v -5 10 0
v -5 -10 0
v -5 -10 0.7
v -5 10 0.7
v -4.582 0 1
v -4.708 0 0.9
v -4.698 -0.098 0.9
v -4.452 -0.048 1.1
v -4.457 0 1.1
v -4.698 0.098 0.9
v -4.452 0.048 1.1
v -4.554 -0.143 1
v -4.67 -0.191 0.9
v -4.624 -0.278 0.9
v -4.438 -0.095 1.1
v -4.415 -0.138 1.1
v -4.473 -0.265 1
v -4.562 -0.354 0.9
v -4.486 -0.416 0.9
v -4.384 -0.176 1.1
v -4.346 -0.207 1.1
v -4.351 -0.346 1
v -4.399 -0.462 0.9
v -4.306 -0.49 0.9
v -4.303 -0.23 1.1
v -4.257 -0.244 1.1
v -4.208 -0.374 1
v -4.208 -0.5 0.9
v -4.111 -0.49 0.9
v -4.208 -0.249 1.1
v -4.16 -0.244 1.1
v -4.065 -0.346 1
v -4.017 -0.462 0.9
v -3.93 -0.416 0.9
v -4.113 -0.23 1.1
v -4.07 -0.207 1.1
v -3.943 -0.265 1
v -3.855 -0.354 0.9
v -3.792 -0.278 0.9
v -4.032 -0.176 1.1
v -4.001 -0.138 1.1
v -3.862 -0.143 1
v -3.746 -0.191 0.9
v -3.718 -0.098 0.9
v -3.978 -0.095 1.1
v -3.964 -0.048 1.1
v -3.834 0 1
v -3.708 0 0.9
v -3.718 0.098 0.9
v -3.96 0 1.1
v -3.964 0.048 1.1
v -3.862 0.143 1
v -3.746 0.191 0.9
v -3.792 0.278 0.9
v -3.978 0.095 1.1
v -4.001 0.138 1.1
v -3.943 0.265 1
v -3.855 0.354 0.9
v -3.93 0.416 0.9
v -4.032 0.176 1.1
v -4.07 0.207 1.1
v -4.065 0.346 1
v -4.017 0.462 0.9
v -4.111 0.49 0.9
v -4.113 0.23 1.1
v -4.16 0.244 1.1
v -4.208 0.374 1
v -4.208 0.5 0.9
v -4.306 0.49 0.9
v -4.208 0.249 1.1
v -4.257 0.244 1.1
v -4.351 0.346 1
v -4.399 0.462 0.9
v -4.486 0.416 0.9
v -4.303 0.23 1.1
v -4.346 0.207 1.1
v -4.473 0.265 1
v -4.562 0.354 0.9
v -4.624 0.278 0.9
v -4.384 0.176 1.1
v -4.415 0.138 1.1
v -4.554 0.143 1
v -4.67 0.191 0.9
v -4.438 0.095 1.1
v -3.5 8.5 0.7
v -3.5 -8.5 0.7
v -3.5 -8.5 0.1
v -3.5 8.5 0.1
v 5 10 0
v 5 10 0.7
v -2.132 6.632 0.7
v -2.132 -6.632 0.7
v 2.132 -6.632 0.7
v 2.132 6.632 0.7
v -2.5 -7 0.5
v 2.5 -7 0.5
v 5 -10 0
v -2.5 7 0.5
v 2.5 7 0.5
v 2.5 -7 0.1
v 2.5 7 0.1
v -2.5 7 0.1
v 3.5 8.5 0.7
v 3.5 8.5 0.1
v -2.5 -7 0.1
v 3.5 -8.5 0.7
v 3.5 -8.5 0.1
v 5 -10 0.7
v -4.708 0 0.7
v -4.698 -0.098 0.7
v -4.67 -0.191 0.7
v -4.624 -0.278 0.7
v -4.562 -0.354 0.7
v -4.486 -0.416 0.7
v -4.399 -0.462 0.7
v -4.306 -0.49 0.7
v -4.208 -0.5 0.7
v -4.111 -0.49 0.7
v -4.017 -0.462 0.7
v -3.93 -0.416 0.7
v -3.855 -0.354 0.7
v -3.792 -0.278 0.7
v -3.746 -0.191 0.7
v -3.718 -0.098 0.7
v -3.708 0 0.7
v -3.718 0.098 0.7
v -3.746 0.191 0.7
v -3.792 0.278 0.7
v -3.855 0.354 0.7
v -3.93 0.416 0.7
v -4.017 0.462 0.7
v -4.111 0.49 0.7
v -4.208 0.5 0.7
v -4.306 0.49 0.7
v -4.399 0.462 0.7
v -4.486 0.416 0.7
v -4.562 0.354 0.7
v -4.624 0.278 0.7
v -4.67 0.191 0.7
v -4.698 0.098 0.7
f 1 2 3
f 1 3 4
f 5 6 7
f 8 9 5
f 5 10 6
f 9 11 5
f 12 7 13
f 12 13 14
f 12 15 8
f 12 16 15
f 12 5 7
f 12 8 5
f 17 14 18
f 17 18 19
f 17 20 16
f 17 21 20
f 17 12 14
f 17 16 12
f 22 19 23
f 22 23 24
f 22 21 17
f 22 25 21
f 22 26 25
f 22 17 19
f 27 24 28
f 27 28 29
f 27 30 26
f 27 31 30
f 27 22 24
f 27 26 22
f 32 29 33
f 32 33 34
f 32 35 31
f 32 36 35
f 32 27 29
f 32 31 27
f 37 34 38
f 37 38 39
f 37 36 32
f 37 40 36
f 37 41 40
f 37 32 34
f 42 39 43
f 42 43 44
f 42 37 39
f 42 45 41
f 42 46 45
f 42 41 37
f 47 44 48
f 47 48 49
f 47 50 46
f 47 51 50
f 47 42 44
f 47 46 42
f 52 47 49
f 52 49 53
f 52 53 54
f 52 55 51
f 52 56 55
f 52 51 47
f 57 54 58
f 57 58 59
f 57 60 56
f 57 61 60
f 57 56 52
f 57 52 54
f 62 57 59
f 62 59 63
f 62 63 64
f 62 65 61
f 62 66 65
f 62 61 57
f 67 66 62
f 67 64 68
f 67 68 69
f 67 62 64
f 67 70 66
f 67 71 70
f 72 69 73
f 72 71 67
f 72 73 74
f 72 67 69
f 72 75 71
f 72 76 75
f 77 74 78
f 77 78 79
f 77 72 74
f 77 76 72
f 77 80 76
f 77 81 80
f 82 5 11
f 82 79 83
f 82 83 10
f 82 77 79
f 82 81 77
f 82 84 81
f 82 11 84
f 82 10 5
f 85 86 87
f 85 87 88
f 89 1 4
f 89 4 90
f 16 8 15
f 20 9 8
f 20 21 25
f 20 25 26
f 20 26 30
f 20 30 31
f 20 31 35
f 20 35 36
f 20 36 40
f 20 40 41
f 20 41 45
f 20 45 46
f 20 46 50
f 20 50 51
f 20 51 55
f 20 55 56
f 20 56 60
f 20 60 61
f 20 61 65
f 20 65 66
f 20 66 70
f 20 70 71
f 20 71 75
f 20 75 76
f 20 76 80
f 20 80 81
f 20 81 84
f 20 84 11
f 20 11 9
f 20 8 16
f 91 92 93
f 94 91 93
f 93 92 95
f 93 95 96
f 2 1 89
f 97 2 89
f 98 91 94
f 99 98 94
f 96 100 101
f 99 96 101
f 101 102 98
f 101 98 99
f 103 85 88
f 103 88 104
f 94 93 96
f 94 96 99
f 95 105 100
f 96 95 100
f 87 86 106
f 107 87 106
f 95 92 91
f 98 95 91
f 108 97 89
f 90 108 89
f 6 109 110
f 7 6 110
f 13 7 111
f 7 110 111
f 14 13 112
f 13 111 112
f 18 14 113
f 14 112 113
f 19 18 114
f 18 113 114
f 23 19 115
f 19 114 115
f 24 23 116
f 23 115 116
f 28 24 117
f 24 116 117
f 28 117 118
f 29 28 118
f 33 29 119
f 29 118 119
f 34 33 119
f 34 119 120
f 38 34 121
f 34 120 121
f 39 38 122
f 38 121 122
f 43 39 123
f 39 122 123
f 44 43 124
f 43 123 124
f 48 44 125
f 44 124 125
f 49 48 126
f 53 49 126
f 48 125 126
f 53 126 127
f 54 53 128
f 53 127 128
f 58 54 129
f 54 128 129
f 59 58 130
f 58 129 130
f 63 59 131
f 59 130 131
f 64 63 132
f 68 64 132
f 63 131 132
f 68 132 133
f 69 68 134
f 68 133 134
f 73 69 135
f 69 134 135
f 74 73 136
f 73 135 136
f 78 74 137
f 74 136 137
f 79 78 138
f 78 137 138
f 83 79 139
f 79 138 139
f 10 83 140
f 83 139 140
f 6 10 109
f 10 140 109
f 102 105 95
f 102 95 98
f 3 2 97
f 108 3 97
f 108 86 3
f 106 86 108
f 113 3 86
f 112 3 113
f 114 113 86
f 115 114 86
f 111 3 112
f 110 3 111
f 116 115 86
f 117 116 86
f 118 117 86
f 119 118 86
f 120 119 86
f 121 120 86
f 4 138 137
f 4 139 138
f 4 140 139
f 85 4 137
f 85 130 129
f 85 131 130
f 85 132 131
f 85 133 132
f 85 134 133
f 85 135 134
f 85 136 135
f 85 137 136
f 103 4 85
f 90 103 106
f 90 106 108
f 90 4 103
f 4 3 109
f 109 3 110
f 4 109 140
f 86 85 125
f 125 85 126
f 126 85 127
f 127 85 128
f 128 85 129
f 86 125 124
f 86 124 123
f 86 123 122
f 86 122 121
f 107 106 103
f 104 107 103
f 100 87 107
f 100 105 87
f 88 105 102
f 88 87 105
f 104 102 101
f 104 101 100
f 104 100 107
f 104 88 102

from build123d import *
from OCP.BRepFilletAPI import BRepFilletAPI_MakeChamfer

# Parameters (mm, degrees)
CROQUIS2_W              = 10
CROQUIS2_H              = 20
SALIENTE_EXTRUIR1_DEPTH = 0.7
CROQUIS3_W              = 7
CROQUIS3_H              = 17
CORTAR_EXTRUIR1_DEPTH   = 0.6
CROQUIS4_W              = 5
CROQUIS4_H              = 14
SALIENTE_EXTRUIR2_DEPTH = 0.6
CHAFL_N1_SIZE           = 0.2
CHAFL_N1_SIZE2          = 0.368354177
CROQUIS5_R              = 0.5
SALIENTE_EXTRUIR3_DEPTH = 0.4
CHAFL_N2_SIZE           = 0.2
CHAFL_N2_SIZE2          = 0.25143446


with BuildPart() as part:
    # Croquis2 → Saliente-Extruir1 (new body)
    with BuildSketch(Plane.XY):
        Rectangle(CROQUIS2_W, CROQUIS2_H)
    extrude(amount=SALIENTE_EXTRUIR1_DEPTH)

    # Croquis3 → Cortar-Extruir1 (cut)
    with BuildSketch(Plane.XY.offset(0.7)):
        Rectangle(CROQUIS3_W, CROQUIS3_H)
    extrude(amount=-CORTAR_EXTRUIR1_DEPTH, mode=Mode.SUBTRACT)

    # Croquis4 → Saliente-Extruir2 (add)
    with BuildSketch(Plane.XY.offset(0.1)):
        Rectangle(CROQUIS4_W, CROQUIS4_H)
    extrude(amount=SALIENTE_EXTRUIR2_DEPTH)

    # Chaflán1: one chamfer whose edges measure the first distance from different faces: ONE call of the kernel's chamfer builder (chamfer() names one face for all edges)
    chafl_n1_edges_1 = [part.edges().sort_by_distance(p)[0] for p in [
        (2.5, 0, 0.7),
    ]]
    chafl_n1_side_1 = [part.faces().sort_by_distance(p)[0] for p in [
        (2.5, 0, 0.4),
    ]]
    chafl_n1_edges_2 = [part.edges().sort_by_distance(p)[0] for p in [
        (0, 7, 0.7),
    ]]
    chafl_n1_side_2 = [part.faces().sort_by_distance(p)[0] for p in [
        (0, 7, 0.4),
    ]]
    chafl_n1_edges_3 = [part.edges().sort_by_distance(p)[0] for p in [
        (-2.5, 0, 0.7),
    ]]
    chafl_n1_side_3 = [part.faces().sort_by_distance(p)[0] for p in [
        (-2.5, 0, 0.4),
    ]]
    chafl_n1_edges_4 = [part.edges().sort_by_distance(p)[0] for p in [
        (0, -7, 0.7),
    ]]
    chafl_n1_side_4 = [part.faces().sort_by_distance(p)[0] for p in [
        (0, -7, 0.4),
    ]]
    chafl_n1 = BRepFilletAPI_MakeChamfer(part.part.solid().wrapped)
    for e in chafl_n1_edges_1:
        chafl_n1.Add(CHAFL_N1_SIZE, CHAFL_N1_SIZE2, e.wrapped, chafl_n1_side_1[0].wrapped)  # the first distance lies on this face
    for e in chafl_n1_edges_2:
        chafl_n1.Add(CHAFL_N1_SIZE, CHAFL_N1_SIZE2, e.wrapped, chafl_n1_side_2[0].wrapped)  # the first distance lies on this face
    for e in chafl_n1_edges_3:
        chafl_n1.Add(CHAFL_N1_SIZE, CHAFL_N1_SIZE2, e.wrapped, chafl_n1_side_3[0].wrapped)  # the first distance lies on this face
    for e in chafl_n1_edges_4:
        chafl_n1.Add(CHAFL_N1_SIZE, CHAFL_N1_SIZE2, e.wrapped, chafl_n1_side_4[0].wrapped)  # the first distance lies on this face
    add(Compound.cast(chafl_n1.Shape()), mode=Mode.REPLACE)

    # Croquis5 → Saliente-Extruir3 (add)
    with BuildSketch(Plane.XY.offset(0.7)):
        with Locations(Location((-4.208071118, 0, 0), (0, 0, 180))):
            Circle(CROQUIS5_R)
    extrude(amount=SALIENTE_EXTRUIR3_DEPTH)

    # Chaflán2
    chafl_n2_edges = [part.edges().sort_by_distance(p)[0] for p in [
        (-3.708071118, 0, 1.1),
    ]]
    chafl_n2_side = [part.faces().sort_by_distance(p)[0] for p in [
        (-3.708071118, 0, 0.9),
    ]]
    chamfer(chafl_n2_edges, length=CHAFL_N2_SIZE, length2=CHAFL_N2_SIZE2, reference=chafl_n2_side[0])


solid = part.part
